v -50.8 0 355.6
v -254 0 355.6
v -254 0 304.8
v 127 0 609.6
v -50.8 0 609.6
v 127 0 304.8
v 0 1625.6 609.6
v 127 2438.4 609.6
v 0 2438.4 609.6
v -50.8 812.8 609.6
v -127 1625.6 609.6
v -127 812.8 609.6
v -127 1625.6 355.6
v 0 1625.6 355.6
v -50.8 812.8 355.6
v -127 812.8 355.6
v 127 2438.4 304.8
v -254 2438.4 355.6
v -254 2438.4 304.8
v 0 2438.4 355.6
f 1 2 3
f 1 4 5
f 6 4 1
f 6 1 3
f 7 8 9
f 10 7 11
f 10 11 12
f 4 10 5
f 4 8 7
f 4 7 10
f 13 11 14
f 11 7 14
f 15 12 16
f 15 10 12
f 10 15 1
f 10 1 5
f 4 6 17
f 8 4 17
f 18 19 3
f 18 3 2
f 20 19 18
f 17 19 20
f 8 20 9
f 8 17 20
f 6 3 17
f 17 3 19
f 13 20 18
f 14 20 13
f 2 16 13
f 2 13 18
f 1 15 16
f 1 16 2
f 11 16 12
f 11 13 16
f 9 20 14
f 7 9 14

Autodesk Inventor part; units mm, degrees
ref_plane "YZ Plane" through (0, 0, 0) normal (1, 0, 0) x (0, 1, 0)
sketch "Sketch1" plane through (0, 0, 0) normal (0, 0, 1) x (1, 0, 0)
  line L0 (0, 0) -> (127, 0)
  line L1 (127, 0) -> (127, 2438.4)
  line L2 (127, 2438.4) -> (0, 2438.4)
  line L3 (0, 2438.4) -> (0, 0)
  dimension "d0" = 127
  dimension "d1" = 2438.4
extrude "Extrusion1" add sketch "Sketch1" along normal blind 609.6
sketch "Sketch3" plane through (0, 0, 0) normal (-1, 0, 0) x (0, 0, 1)
  line L0 (609.6, 2438.4) -> (609.6, 0) projected
  line L1 (0, 2438.4) -> (0, 0) projected
  line L2 (0, 0) -> (609.6, 0) projected
  line L3 (609.6, 0) -> (609.6, 2438.4) projected
  line L4 (0, 0) -> (609.6, 0)
  line L5 (609.6, 0) -> (609.6, 812.8)
  line L6 (609.6, 812.8) -> (0, 812.8)
  line L7 (0, 812.8) -> (0, 0)
  dimension "d8" = 812.8
extrude "Extrusion3" add sketch "Sketch3" along normal blind 50.8
sketch "Sketch4" plane through (0, 2438.4, 0) normal (-1, 0, 0) x (0, 0, 1)
  line L0 (609.6, -1625.6) -> (0, -1625.6) projected
  line L1 (609.6, 0) -> (609.6, -1625.6) projected
  line L2 (0, 0) -> (0, -1625.6) projected
  line L3 (0, -1625.6) -> (609.6, -1625.6)
  line L4 (609.6, -1625.6) -> (609.6, -812.8)
  line L5 (609.6, -812.8) -> (0, -812.8)
  line L6 (0, -812.8) -> (0, -1625.6)
  point P0 (0, -2438.4)
  dimension "d11" = 812.8
extrude "Extrusion4" add sketch "Sketch4" along normal blind 127
sketch "Sketch5" plane through (0, 1625.6, 0) normal (-1, 0, 0) x (0, 0, 1)
  line L0 (519.5823, 575.5562) -> (519.5823, 226.8611) construction
  line L1 (519.5823, 226.8611) -> (23.9628, 226.8611) construction
  line L2 (23.9628, 226.8611) -> (23.9628, 575.5562) construction
  line L3 (23.9628, 575.5562) -> (519.5823, 575.5562) construction
  point P0 (0, -1625.6)
sketch "Sketch6" plane through (-127, 2438.4, 0) normal (-1, 0, 0) x (0, 0, 1)
  line L0 (504.953, -1049.3947) -> (504.953, -1386.624) construction
  line L1 (504.953, -1386.624) -> (88.8121, -1386.624) construction
  line L2 (88.8121, -1386.624) -> (88.8121, -1049.3947) construction
  line L3 (88.8121, -1049.3947) -> (504.953, -1049.3947) construction
  point P0 (0, -2438.4)
sketch "Sketch7" plane through (-50.8, 0, 0) normal (-1, 0, 0) x (0, 0, 1)
  line L0 (510.0659, 619.5124) -> (510.0659, 275.8757) construction
  line L1 (510.0659, 275.8757) -> (79.0869, 275.8757) construction
  line L2 (79.0869, 275.8757) -> (79.0869, 619.5124) construction
  line L3 (79.0869, 619.5124) -> (510.0659, 619.5124) construction
  point P0 (0, 0)
sketch "Sketch8" plane through (-50.8, 0, 0) normal (-1, 0, 0) x (0, 0, 1)
  line L0 (0, 812.8) -> (609.6, 812.8) projected
  line L1 (0, 0) -> (609.6, 0) projected
  line L2 (355.6, 812.8) -> (254, 812.8)
  line L3 (254, 812.8) -> (254, 0)
  line L4 (254, 0) -> (355.6, 0)
  line L5 (355.6, 0) -> (355.6, 812.8)
  line L6 (609.6, 0) -> (609.6, 812.8) projected
  line L7 (0, 812.8) -> (0, 0) projected
  point P0 (127, 0)
  point P1 (482.6, 0)
  point P2 (609.6, 127)
  point P3 (0, 127)
  dimension "d15" = 254
  dimension "d16" = 254
extrude "Extrusion5" add sketch "Sketch8" along normal up to surface (76.2 mm away) contours L0 L5 L1 L3
sketch "Sketch9" plane through (-127, 2438.4, 0) normal (-1, 0, 0) x (0, 0, 1)
  line L0 (254, -2438.4) -> (254, -1625.6) projected
  line L1 (355.6, -1625.6) -> (355.6, -2438.4) projected
  line L2 (609.6, -812.8) -> (0, -812.8) projected
  line L3 (355.6, -1625.6) -> (254, -1625.6)
  line L4 (254, -1625.6) -> (254, -812.8)
  line L5 (254, -812.8) -> (355.6, -812.8)
  line L6 (355.6, -812.8) -> (355.6, -1625.6)
  point P0 (0, -2438.4)
extrude "Extrusion6" add sketch "Sketch9" along normal blind 127
sketch "Sketch10" plane through (0, 1625.6, 0) normal (-1, 0, 0) x (0, 0, 1)
  line L0 (254, 0) -> (254, -812.8) projected
  line L1 (355.6, -812.8) -> (355.6, 0) projected
  line L2 (355.6, 0) -> (254, 0) projected
  line L3 (0, 812.8) -> (609.6, 812.8) projected
  line L4 (355.6, 0) -> (254, 0)
  line L5 (254, 0) -> (254, 812.8)
  line L6 (254, 812.8) -> (355.6, 812.8)
  line L7 (355.6, 812.8) -> (355.6, 0)
  point P0 (0, -1625.6)
  point P1 (127, 812.8)
  point P2 (482.6, 812.8)
extrude "Extrusion7" add sketch "Sketch10" along normal up to surface (254 mm away)
sketch "Sketch11" plane through (-127, 2438.4, 0) normal (-1, 0, 0) x (0, 0, 1)
  line L0 (254, -1625.6) -> (355.6, -1625.6) projected
  line L1 (254, -2438.4) -> (254, -1625.6) projected
  line L2 (355.6, -1625.6) -> (355.6, -2438.4) projected
  line L3 (355.6, -2438.4) -> (254, -2438.4) projected
  point P0 (0, -2438.4)
extrude "Extrusion8" add sketch "Sketch11" along normal up to surface (127 mm away)
ref_plane "Work Plane1" through (-50.8, 1219.2, 482.6) normal (0, -1, 0) x (1, 0, 0)
ref_plane "Work Plane2" through (0, 0, 304.8) normal (0, 0, 1) x (1, 0, 0)
sketch "Sketch15" plane through (-254, 2438.4, 0) normal (-1, 0, 0) x (0, 0, 1)
  line L0 (-285.5024, -2708.2595) -> (304.8, -2708.2595)
  line L1 (304.8, -2708.2595) -> (304.8, 202.5179)
  line L2 (304.8, 202.5179) -> (-285.5024, 202.5179)
  line L3 (-285.5024, 202.5179) -> (-285.5024, -2708.2595)
  line L4 (254, -2438.4) -> (254, 0) projected
  line L5 (355.6, 0) -> (355.6, -2438.4) projected
  point P0 (0, -2438.4)
  dimension "d55" = 50.8
  dimension "d56" = 50.8
extrude "Extrusion12" cut sketch "Sketch15" against normal blind 865.1875
equation "\"d8\" = 0.333333 * d1"
equation "\"d11\" = 0.333333 * d1"
properties part number "Hill"
